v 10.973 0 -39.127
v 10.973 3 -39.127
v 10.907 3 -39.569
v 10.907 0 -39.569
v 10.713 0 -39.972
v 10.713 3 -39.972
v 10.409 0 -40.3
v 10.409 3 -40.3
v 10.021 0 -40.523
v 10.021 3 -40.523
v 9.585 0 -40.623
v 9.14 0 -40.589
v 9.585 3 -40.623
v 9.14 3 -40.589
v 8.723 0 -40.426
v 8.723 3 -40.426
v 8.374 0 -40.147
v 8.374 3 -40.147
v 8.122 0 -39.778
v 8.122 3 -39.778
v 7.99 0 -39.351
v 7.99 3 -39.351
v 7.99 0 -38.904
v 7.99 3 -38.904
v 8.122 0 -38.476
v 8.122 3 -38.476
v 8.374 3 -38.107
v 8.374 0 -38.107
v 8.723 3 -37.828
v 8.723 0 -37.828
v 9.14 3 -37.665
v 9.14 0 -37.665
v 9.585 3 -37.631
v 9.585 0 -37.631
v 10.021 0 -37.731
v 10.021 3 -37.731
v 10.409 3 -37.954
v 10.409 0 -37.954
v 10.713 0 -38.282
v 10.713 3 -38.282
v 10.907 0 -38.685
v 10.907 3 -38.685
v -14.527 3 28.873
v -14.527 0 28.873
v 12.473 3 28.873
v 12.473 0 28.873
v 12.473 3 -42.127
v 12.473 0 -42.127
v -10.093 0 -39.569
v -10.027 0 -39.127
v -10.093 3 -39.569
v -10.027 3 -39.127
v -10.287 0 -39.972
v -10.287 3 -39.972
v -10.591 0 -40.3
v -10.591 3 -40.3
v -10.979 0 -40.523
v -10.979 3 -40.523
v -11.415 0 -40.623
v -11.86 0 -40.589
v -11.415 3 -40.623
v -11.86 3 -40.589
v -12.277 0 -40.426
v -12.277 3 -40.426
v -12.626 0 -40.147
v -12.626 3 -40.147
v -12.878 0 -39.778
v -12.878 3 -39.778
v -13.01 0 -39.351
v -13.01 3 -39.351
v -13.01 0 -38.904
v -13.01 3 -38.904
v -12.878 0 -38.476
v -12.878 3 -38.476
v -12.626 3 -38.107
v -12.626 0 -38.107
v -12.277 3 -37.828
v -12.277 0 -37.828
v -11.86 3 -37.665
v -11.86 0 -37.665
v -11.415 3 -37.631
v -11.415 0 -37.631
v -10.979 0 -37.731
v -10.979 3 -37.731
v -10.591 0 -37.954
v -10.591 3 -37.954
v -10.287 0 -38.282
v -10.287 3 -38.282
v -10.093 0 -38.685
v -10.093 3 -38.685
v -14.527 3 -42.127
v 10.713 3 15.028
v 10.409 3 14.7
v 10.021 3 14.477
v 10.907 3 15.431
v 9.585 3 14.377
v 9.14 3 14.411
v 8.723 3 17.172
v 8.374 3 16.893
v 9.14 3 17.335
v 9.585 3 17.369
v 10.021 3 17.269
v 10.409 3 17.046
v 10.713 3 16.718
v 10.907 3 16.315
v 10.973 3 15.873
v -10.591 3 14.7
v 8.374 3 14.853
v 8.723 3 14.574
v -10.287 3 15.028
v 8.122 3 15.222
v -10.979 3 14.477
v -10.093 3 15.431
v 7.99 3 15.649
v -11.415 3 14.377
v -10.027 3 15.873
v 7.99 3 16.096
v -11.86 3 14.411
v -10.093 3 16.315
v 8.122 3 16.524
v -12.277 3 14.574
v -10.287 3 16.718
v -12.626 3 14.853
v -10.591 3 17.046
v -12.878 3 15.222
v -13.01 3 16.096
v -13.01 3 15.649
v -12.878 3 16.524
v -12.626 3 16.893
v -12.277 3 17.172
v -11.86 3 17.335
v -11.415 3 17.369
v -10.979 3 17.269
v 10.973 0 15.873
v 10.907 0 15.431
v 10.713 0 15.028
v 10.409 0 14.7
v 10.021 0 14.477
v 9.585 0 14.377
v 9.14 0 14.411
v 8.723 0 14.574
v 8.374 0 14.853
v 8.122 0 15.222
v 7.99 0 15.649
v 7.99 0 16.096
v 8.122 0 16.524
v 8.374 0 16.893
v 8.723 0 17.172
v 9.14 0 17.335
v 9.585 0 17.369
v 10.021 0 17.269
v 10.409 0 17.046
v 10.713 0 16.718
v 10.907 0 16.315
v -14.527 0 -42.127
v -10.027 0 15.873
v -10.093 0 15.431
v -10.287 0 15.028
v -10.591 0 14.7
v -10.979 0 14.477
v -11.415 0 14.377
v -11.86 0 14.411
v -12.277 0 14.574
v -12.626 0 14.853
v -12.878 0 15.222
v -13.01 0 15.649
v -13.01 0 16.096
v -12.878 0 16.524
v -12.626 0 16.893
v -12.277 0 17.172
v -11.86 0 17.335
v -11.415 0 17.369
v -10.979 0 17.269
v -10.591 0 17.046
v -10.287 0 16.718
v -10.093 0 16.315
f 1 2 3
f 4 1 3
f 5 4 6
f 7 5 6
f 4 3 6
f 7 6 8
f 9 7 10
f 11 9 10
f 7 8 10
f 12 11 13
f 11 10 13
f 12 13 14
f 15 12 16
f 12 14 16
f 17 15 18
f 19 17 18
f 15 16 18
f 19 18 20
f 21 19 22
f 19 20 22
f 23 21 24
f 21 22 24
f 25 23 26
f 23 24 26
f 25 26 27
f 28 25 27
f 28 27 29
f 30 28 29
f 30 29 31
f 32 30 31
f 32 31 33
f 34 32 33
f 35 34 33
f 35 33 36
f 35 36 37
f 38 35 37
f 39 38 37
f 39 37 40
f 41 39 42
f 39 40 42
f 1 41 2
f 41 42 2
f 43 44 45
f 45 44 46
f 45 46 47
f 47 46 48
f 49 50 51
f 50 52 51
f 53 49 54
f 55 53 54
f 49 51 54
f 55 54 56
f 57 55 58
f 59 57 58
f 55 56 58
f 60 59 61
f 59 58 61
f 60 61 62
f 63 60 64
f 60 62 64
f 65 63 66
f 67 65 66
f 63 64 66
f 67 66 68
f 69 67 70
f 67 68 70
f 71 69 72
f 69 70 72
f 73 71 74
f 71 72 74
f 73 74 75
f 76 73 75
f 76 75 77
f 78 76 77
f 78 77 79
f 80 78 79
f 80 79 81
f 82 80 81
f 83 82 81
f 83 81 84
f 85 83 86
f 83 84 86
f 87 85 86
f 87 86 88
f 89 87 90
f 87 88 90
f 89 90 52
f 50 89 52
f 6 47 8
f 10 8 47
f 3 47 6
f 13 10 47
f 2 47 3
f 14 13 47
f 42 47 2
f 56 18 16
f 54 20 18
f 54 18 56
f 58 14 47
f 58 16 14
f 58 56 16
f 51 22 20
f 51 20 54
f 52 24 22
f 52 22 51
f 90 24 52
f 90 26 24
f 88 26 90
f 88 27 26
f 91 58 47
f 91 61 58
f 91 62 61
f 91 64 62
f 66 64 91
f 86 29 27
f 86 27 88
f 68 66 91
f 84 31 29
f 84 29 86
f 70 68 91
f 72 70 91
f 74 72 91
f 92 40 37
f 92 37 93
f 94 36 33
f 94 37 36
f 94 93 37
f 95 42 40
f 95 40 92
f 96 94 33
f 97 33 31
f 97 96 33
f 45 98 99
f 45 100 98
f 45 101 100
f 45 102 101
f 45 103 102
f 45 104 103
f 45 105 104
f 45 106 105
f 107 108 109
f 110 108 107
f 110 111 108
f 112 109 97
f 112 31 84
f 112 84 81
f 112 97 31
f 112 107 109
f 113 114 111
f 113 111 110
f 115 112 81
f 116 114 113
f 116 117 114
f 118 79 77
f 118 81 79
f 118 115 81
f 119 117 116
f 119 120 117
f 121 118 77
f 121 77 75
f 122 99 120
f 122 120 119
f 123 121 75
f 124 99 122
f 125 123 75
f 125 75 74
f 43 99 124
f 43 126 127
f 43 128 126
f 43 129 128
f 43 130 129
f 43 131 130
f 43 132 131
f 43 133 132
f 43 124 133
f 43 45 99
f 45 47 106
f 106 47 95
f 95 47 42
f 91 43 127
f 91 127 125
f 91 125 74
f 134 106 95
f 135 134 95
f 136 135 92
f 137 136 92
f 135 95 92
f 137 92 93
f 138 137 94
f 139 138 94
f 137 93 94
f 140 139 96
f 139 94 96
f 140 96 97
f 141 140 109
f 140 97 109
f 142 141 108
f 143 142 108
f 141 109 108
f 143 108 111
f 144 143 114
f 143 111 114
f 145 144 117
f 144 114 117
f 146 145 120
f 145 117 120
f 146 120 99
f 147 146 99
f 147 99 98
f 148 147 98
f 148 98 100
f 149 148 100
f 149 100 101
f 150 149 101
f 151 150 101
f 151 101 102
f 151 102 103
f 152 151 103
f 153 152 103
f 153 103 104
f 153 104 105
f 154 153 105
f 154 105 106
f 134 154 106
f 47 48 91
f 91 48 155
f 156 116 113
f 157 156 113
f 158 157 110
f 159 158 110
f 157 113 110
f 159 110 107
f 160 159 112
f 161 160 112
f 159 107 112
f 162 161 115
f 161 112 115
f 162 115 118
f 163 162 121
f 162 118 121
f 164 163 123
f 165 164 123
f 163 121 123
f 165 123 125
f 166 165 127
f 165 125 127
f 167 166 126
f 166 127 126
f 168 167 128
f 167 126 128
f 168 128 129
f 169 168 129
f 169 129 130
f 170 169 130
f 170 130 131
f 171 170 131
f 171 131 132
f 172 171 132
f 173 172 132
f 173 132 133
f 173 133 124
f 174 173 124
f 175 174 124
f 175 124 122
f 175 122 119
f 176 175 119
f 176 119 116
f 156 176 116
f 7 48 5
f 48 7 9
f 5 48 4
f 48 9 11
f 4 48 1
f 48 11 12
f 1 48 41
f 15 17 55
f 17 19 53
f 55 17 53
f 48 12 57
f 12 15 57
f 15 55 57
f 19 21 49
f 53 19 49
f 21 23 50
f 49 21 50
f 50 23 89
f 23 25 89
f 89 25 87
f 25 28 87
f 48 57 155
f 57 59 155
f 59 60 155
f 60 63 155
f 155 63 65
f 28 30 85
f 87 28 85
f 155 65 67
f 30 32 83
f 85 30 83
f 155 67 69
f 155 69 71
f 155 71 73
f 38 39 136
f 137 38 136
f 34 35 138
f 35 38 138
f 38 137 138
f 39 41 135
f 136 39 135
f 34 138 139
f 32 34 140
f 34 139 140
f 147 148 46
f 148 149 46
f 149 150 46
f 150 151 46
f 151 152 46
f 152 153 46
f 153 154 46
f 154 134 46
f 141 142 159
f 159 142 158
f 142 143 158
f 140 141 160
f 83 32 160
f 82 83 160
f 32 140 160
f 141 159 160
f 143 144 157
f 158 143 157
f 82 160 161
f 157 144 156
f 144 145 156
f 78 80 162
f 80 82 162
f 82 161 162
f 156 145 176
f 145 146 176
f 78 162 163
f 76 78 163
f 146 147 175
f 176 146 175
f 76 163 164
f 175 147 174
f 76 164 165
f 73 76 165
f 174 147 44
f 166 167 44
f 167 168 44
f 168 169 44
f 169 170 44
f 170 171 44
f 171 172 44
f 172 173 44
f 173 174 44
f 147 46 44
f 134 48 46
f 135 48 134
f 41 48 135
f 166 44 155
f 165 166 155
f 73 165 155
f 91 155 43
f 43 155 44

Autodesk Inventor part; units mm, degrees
ref_plane "YZ Plane" through (0, 0, 0) normal (1, 0, 0) x (0, 1, 0)
ref_plane "XZ Plane" through (0, 0, 0) normal (0, 1, 0) x (-1, 0, 0)
ref_plane "XY Plane" through (0, 0, 0) normal (0, 0, 1) x (1, 0, 0)
sketch "Sketch1" plane through (0, 0, 0) normal (0, 1, 0) x (-1, 0, 0)
  line L0 (14.5266, 28.8729) -> (-12.4734, 28.8729)
  line L1 (-12.4734, 28.8729) -> (-12.4734, -42.1271)
  line L2 (-12.4734, -42.1271) -> (14.5266, -42.1271)
  line L3 (14.5266, -42.1271) -> (14.5266, 28.8729)
  point P0 (0, 0)
  dimension "d0" = 71
  dimension "d1" = 27
extrude "Extrusion1" add sketch "Sketch1" along normal blind 3
sketch "Sketch2" plane through (0, 3, 0) normal (0, 1, 0) x (1, 0, 0)
  circle A0 centre (-11.5266, -15.8729) radius 1.5
  line L0 (-14.5266, -28.8729) -> (12.4734, -28.8729) projected
  line L1 (-14.5266, 42.1271) -> (-14.5266, -28.8729) projected
  circle A1 centre (-11.5266, 39.1271) radius 1.5
  circle A2 centre (9.4734, -15.8729) radius 1.5
  circle A3 centre (9.4734, 39.1271) radius 1.5
  point P0 (0, 0)
  dimension "d4" = 3
  dimension "d5" = 3
  dimension "d6" = 13
  dimension "d9" = 55
  dimension "d12" = 21
extrude "Extrusion2" cut sketch "Sketch2" against normal through all
properties part number "k2_t2_base"
